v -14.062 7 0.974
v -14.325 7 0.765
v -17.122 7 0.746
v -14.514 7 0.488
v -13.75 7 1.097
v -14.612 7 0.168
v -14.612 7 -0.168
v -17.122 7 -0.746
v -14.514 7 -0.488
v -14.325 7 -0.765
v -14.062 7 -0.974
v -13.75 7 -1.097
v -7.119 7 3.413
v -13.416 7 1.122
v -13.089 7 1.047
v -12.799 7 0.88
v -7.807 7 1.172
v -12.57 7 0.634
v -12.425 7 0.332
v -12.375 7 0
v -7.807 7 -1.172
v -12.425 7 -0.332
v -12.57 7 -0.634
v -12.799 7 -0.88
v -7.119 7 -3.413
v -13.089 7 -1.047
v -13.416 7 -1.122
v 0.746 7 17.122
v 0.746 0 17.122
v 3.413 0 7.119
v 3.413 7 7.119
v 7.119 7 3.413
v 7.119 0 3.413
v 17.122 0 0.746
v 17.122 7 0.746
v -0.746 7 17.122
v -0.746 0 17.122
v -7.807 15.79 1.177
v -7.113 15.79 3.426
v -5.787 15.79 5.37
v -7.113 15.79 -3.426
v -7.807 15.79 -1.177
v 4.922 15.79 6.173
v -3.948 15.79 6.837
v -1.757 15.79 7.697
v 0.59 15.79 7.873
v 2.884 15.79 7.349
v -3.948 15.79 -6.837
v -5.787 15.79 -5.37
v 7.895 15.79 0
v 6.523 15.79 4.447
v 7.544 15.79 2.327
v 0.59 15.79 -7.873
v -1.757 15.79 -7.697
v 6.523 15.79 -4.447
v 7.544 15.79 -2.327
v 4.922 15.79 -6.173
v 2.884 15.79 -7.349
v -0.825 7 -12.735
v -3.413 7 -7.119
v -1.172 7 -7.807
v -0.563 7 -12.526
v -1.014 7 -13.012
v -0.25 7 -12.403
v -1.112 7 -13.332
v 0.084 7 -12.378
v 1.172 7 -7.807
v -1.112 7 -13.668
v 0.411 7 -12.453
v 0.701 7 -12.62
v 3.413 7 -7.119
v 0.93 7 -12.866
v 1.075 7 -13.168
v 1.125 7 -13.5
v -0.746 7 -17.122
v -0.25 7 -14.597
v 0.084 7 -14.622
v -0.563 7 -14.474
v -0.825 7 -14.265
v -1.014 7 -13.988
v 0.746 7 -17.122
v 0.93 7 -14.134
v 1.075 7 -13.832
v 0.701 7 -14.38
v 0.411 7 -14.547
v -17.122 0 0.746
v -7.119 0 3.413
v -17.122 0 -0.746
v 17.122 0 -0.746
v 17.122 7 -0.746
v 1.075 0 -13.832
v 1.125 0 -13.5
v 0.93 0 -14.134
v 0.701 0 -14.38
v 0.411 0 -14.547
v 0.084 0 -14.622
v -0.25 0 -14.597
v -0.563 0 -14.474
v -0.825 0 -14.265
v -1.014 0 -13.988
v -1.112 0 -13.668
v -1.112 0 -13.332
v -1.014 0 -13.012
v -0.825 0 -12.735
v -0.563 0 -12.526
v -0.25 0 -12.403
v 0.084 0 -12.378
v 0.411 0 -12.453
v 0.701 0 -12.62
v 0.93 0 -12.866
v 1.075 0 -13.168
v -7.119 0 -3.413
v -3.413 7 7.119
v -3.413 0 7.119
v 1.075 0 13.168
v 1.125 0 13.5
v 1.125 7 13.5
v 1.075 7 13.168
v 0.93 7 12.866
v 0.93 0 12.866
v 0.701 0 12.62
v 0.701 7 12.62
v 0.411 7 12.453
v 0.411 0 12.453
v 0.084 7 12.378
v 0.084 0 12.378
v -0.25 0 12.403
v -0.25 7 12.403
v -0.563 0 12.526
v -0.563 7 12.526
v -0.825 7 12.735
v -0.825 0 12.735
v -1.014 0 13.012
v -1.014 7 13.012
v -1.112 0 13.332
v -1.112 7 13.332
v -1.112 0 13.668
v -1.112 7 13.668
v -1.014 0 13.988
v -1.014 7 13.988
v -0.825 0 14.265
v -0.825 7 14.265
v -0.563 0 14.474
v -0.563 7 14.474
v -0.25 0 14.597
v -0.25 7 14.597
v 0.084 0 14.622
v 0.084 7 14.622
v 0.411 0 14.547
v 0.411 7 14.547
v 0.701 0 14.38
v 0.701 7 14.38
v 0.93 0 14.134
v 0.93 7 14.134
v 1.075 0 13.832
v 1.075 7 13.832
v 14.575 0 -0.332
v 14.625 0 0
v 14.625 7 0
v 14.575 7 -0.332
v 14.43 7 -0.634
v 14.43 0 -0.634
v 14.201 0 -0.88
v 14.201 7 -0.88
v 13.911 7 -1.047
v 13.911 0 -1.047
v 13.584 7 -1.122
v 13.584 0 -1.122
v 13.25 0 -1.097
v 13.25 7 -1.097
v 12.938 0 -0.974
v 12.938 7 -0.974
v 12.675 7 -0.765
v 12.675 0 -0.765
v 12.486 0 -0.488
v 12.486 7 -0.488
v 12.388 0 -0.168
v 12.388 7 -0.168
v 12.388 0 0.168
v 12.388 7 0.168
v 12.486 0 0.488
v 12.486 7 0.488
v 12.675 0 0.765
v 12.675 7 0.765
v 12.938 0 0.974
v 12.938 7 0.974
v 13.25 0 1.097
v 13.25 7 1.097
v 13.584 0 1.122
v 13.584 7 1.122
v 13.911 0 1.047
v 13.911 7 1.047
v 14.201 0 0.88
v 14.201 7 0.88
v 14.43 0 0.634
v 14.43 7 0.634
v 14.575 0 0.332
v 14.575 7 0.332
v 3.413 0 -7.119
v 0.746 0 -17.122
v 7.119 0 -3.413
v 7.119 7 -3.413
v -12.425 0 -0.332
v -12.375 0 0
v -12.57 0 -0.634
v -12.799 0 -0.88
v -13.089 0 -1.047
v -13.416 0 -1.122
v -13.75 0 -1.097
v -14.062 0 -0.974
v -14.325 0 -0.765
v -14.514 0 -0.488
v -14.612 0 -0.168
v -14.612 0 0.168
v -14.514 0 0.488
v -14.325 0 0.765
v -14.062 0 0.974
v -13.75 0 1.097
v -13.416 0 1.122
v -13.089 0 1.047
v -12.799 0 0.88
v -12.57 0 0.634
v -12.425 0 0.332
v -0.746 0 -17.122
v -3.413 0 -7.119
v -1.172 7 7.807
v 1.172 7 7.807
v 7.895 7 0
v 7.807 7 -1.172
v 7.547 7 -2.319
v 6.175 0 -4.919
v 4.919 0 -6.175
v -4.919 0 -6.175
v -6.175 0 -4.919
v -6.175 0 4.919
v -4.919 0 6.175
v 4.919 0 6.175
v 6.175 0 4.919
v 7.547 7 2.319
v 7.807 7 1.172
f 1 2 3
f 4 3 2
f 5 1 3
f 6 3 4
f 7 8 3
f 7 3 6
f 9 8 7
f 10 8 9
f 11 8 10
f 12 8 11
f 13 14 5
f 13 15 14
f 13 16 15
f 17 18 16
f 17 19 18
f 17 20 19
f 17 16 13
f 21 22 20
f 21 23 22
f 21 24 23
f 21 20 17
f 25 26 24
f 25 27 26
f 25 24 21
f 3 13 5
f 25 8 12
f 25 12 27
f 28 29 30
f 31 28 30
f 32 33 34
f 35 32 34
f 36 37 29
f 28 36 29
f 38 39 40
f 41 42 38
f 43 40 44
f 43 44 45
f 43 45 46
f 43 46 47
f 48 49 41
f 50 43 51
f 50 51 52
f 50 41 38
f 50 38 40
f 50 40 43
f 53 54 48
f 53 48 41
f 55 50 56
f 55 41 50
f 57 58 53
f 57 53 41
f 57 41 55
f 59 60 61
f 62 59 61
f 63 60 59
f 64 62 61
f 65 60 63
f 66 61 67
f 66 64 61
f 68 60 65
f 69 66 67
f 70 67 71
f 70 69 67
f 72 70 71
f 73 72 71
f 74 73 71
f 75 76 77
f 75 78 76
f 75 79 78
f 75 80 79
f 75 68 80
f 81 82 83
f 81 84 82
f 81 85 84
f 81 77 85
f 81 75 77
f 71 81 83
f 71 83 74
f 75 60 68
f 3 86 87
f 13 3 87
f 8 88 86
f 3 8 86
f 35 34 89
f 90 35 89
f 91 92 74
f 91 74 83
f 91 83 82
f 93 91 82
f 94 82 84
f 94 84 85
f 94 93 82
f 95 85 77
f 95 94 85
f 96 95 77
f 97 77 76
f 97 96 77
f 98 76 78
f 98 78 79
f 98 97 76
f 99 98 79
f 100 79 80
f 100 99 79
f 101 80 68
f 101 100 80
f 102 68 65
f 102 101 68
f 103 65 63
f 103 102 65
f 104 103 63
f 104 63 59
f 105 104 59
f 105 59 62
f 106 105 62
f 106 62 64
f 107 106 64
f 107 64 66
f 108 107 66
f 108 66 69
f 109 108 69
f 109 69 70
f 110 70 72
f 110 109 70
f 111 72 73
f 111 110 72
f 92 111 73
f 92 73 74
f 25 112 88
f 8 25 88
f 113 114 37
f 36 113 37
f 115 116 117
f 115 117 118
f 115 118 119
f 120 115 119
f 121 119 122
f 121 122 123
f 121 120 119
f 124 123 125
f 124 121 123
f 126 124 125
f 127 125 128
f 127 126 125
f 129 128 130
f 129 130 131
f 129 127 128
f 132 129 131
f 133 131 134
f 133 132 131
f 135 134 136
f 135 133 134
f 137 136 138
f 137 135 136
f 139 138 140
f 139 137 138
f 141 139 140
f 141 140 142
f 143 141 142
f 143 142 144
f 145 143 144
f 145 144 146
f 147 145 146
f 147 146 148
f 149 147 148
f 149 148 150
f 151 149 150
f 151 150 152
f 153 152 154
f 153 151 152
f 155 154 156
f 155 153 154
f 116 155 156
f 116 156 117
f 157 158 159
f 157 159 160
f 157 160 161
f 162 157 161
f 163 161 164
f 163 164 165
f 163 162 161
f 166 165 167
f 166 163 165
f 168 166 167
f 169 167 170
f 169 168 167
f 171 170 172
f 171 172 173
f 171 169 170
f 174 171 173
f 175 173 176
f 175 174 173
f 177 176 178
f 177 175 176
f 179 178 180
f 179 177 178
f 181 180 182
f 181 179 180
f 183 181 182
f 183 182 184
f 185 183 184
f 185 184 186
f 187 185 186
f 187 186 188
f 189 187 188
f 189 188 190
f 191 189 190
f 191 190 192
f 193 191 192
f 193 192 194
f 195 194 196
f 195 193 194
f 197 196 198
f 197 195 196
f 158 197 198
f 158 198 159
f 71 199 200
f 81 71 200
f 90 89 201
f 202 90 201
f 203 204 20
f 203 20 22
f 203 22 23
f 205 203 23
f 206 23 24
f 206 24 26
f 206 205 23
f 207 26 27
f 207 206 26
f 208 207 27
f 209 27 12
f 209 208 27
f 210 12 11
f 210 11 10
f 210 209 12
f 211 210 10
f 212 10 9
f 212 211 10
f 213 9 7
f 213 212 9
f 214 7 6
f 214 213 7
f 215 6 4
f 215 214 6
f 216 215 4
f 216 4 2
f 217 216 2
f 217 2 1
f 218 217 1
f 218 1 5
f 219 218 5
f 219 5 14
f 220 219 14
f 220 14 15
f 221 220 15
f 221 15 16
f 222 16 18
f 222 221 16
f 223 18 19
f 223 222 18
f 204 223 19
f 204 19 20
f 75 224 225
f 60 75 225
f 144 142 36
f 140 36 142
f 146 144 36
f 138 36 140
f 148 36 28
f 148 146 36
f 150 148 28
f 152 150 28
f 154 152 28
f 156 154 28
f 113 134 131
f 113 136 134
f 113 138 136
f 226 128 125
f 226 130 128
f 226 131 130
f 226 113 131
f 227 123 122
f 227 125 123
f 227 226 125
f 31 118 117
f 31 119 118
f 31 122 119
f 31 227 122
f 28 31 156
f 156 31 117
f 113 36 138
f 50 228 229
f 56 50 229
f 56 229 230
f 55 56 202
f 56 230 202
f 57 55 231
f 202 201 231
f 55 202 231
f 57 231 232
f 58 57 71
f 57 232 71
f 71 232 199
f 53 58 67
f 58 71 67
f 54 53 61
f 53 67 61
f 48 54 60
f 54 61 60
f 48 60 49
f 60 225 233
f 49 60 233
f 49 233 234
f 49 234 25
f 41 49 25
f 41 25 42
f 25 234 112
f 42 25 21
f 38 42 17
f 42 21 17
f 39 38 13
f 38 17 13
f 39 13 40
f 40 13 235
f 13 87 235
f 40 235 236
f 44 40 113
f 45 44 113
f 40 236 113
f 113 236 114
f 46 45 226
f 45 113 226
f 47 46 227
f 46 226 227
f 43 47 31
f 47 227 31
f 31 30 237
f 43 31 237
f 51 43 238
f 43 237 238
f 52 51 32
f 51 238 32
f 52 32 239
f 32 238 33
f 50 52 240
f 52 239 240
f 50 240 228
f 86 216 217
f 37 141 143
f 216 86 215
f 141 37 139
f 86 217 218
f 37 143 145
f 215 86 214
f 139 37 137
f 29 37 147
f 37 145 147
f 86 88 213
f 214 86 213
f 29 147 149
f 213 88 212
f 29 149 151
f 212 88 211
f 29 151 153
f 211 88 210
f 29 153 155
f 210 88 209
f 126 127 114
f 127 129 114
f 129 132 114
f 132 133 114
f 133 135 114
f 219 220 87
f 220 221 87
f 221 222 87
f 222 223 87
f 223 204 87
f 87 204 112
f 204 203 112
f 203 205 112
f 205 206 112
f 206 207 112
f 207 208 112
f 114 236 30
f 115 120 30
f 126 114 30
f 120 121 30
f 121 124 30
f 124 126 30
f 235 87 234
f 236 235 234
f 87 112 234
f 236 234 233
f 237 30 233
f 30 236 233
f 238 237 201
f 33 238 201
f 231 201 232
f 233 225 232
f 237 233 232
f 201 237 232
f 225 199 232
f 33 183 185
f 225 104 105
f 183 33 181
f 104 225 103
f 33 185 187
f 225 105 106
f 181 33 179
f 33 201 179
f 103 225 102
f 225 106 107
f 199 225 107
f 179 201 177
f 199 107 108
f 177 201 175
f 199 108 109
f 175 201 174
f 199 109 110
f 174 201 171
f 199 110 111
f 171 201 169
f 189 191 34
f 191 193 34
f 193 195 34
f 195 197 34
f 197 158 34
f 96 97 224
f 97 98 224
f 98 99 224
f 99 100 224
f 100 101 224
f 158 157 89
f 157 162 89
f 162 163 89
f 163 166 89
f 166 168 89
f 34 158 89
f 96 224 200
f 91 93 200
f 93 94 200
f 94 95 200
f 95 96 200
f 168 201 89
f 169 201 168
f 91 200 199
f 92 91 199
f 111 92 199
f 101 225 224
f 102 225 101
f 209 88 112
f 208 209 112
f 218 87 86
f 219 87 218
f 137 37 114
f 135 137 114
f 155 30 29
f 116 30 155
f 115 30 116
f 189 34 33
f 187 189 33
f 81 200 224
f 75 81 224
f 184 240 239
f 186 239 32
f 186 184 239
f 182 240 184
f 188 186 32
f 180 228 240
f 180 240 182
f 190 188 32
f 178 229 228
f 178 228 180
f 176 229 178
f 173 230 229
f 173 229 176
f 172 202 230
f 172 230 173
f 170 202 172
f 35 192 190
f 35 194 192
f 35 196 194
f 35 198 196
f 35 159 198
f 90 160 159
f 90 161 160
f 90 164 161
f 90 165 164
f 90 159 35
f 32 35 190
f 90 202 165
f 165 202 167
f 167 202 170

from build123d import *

# Parameters (mm, degrees)
SKETCH1_R           = 7.895
BOSS_EXTRUDE1_DEPTH = 15.79
SKETCH2_R           = 1.125
BOSS_EXTRUDE2_DEPTH = 7


with BuildPart() as part:
    # Sketch1 → Boss-Extrude1 (new body)
    with BuildSketch(Plane(origin=(0, 0, 0), x_dir=(1, 0, 0), z_dir=(0, 1, 0))):
        Circle(SKETCH1_R)
    extrude(amount=BOSS_EXTRUDE1_DEPTH)

    # Sketch2 → Boss-Extrude2 (add)
    with BuildSketch(Plane(origin=(0, 0, 0), x_dir=(1, 0, 0), z_dir=(0, 1, 0))):
        Polygon((7.118925688, -3.413491182), (17.121835898, -0.746202613), (17.121835898, 0.746202613), (7.118925688, 3.413491182), (3.413491182, 7.118925688), (0.746202613, 17.121835898), (-0.746202613, 17.121835898), (-3.413491182, 7.118925688), (-7.118925688, 3.413491182), (-17.121835898, 0.746202613), (-17.121835898, -0.746202613), (-7.118925688, -3.413491182), (-3.413491182, -7.118925688), (-0.746202613, -17.121835898), (0.746202613, -17.121835898), (3.413491182, -7.118925688), align=None)
        with Locations((13.5, 0)):
            Circle(SKETCH2_R, mode=Mode.SUBTRACT)
        with Locations((0, -13.5)):
            Circle(SKETCH2_R, mode=Mode.SUBTRACT)
        with Locations((-13.5, 0)):
            Circle(SKETCH2_R, mode=Mode.SUBTRACT)
        with Locations((0, 13.5)):
            Circle(SKETCH2_R, mode=Mode.SUBTRACT)
    extrude(amount=BOSS_EXTRUDE2_DEPTH)


solid = part.part
